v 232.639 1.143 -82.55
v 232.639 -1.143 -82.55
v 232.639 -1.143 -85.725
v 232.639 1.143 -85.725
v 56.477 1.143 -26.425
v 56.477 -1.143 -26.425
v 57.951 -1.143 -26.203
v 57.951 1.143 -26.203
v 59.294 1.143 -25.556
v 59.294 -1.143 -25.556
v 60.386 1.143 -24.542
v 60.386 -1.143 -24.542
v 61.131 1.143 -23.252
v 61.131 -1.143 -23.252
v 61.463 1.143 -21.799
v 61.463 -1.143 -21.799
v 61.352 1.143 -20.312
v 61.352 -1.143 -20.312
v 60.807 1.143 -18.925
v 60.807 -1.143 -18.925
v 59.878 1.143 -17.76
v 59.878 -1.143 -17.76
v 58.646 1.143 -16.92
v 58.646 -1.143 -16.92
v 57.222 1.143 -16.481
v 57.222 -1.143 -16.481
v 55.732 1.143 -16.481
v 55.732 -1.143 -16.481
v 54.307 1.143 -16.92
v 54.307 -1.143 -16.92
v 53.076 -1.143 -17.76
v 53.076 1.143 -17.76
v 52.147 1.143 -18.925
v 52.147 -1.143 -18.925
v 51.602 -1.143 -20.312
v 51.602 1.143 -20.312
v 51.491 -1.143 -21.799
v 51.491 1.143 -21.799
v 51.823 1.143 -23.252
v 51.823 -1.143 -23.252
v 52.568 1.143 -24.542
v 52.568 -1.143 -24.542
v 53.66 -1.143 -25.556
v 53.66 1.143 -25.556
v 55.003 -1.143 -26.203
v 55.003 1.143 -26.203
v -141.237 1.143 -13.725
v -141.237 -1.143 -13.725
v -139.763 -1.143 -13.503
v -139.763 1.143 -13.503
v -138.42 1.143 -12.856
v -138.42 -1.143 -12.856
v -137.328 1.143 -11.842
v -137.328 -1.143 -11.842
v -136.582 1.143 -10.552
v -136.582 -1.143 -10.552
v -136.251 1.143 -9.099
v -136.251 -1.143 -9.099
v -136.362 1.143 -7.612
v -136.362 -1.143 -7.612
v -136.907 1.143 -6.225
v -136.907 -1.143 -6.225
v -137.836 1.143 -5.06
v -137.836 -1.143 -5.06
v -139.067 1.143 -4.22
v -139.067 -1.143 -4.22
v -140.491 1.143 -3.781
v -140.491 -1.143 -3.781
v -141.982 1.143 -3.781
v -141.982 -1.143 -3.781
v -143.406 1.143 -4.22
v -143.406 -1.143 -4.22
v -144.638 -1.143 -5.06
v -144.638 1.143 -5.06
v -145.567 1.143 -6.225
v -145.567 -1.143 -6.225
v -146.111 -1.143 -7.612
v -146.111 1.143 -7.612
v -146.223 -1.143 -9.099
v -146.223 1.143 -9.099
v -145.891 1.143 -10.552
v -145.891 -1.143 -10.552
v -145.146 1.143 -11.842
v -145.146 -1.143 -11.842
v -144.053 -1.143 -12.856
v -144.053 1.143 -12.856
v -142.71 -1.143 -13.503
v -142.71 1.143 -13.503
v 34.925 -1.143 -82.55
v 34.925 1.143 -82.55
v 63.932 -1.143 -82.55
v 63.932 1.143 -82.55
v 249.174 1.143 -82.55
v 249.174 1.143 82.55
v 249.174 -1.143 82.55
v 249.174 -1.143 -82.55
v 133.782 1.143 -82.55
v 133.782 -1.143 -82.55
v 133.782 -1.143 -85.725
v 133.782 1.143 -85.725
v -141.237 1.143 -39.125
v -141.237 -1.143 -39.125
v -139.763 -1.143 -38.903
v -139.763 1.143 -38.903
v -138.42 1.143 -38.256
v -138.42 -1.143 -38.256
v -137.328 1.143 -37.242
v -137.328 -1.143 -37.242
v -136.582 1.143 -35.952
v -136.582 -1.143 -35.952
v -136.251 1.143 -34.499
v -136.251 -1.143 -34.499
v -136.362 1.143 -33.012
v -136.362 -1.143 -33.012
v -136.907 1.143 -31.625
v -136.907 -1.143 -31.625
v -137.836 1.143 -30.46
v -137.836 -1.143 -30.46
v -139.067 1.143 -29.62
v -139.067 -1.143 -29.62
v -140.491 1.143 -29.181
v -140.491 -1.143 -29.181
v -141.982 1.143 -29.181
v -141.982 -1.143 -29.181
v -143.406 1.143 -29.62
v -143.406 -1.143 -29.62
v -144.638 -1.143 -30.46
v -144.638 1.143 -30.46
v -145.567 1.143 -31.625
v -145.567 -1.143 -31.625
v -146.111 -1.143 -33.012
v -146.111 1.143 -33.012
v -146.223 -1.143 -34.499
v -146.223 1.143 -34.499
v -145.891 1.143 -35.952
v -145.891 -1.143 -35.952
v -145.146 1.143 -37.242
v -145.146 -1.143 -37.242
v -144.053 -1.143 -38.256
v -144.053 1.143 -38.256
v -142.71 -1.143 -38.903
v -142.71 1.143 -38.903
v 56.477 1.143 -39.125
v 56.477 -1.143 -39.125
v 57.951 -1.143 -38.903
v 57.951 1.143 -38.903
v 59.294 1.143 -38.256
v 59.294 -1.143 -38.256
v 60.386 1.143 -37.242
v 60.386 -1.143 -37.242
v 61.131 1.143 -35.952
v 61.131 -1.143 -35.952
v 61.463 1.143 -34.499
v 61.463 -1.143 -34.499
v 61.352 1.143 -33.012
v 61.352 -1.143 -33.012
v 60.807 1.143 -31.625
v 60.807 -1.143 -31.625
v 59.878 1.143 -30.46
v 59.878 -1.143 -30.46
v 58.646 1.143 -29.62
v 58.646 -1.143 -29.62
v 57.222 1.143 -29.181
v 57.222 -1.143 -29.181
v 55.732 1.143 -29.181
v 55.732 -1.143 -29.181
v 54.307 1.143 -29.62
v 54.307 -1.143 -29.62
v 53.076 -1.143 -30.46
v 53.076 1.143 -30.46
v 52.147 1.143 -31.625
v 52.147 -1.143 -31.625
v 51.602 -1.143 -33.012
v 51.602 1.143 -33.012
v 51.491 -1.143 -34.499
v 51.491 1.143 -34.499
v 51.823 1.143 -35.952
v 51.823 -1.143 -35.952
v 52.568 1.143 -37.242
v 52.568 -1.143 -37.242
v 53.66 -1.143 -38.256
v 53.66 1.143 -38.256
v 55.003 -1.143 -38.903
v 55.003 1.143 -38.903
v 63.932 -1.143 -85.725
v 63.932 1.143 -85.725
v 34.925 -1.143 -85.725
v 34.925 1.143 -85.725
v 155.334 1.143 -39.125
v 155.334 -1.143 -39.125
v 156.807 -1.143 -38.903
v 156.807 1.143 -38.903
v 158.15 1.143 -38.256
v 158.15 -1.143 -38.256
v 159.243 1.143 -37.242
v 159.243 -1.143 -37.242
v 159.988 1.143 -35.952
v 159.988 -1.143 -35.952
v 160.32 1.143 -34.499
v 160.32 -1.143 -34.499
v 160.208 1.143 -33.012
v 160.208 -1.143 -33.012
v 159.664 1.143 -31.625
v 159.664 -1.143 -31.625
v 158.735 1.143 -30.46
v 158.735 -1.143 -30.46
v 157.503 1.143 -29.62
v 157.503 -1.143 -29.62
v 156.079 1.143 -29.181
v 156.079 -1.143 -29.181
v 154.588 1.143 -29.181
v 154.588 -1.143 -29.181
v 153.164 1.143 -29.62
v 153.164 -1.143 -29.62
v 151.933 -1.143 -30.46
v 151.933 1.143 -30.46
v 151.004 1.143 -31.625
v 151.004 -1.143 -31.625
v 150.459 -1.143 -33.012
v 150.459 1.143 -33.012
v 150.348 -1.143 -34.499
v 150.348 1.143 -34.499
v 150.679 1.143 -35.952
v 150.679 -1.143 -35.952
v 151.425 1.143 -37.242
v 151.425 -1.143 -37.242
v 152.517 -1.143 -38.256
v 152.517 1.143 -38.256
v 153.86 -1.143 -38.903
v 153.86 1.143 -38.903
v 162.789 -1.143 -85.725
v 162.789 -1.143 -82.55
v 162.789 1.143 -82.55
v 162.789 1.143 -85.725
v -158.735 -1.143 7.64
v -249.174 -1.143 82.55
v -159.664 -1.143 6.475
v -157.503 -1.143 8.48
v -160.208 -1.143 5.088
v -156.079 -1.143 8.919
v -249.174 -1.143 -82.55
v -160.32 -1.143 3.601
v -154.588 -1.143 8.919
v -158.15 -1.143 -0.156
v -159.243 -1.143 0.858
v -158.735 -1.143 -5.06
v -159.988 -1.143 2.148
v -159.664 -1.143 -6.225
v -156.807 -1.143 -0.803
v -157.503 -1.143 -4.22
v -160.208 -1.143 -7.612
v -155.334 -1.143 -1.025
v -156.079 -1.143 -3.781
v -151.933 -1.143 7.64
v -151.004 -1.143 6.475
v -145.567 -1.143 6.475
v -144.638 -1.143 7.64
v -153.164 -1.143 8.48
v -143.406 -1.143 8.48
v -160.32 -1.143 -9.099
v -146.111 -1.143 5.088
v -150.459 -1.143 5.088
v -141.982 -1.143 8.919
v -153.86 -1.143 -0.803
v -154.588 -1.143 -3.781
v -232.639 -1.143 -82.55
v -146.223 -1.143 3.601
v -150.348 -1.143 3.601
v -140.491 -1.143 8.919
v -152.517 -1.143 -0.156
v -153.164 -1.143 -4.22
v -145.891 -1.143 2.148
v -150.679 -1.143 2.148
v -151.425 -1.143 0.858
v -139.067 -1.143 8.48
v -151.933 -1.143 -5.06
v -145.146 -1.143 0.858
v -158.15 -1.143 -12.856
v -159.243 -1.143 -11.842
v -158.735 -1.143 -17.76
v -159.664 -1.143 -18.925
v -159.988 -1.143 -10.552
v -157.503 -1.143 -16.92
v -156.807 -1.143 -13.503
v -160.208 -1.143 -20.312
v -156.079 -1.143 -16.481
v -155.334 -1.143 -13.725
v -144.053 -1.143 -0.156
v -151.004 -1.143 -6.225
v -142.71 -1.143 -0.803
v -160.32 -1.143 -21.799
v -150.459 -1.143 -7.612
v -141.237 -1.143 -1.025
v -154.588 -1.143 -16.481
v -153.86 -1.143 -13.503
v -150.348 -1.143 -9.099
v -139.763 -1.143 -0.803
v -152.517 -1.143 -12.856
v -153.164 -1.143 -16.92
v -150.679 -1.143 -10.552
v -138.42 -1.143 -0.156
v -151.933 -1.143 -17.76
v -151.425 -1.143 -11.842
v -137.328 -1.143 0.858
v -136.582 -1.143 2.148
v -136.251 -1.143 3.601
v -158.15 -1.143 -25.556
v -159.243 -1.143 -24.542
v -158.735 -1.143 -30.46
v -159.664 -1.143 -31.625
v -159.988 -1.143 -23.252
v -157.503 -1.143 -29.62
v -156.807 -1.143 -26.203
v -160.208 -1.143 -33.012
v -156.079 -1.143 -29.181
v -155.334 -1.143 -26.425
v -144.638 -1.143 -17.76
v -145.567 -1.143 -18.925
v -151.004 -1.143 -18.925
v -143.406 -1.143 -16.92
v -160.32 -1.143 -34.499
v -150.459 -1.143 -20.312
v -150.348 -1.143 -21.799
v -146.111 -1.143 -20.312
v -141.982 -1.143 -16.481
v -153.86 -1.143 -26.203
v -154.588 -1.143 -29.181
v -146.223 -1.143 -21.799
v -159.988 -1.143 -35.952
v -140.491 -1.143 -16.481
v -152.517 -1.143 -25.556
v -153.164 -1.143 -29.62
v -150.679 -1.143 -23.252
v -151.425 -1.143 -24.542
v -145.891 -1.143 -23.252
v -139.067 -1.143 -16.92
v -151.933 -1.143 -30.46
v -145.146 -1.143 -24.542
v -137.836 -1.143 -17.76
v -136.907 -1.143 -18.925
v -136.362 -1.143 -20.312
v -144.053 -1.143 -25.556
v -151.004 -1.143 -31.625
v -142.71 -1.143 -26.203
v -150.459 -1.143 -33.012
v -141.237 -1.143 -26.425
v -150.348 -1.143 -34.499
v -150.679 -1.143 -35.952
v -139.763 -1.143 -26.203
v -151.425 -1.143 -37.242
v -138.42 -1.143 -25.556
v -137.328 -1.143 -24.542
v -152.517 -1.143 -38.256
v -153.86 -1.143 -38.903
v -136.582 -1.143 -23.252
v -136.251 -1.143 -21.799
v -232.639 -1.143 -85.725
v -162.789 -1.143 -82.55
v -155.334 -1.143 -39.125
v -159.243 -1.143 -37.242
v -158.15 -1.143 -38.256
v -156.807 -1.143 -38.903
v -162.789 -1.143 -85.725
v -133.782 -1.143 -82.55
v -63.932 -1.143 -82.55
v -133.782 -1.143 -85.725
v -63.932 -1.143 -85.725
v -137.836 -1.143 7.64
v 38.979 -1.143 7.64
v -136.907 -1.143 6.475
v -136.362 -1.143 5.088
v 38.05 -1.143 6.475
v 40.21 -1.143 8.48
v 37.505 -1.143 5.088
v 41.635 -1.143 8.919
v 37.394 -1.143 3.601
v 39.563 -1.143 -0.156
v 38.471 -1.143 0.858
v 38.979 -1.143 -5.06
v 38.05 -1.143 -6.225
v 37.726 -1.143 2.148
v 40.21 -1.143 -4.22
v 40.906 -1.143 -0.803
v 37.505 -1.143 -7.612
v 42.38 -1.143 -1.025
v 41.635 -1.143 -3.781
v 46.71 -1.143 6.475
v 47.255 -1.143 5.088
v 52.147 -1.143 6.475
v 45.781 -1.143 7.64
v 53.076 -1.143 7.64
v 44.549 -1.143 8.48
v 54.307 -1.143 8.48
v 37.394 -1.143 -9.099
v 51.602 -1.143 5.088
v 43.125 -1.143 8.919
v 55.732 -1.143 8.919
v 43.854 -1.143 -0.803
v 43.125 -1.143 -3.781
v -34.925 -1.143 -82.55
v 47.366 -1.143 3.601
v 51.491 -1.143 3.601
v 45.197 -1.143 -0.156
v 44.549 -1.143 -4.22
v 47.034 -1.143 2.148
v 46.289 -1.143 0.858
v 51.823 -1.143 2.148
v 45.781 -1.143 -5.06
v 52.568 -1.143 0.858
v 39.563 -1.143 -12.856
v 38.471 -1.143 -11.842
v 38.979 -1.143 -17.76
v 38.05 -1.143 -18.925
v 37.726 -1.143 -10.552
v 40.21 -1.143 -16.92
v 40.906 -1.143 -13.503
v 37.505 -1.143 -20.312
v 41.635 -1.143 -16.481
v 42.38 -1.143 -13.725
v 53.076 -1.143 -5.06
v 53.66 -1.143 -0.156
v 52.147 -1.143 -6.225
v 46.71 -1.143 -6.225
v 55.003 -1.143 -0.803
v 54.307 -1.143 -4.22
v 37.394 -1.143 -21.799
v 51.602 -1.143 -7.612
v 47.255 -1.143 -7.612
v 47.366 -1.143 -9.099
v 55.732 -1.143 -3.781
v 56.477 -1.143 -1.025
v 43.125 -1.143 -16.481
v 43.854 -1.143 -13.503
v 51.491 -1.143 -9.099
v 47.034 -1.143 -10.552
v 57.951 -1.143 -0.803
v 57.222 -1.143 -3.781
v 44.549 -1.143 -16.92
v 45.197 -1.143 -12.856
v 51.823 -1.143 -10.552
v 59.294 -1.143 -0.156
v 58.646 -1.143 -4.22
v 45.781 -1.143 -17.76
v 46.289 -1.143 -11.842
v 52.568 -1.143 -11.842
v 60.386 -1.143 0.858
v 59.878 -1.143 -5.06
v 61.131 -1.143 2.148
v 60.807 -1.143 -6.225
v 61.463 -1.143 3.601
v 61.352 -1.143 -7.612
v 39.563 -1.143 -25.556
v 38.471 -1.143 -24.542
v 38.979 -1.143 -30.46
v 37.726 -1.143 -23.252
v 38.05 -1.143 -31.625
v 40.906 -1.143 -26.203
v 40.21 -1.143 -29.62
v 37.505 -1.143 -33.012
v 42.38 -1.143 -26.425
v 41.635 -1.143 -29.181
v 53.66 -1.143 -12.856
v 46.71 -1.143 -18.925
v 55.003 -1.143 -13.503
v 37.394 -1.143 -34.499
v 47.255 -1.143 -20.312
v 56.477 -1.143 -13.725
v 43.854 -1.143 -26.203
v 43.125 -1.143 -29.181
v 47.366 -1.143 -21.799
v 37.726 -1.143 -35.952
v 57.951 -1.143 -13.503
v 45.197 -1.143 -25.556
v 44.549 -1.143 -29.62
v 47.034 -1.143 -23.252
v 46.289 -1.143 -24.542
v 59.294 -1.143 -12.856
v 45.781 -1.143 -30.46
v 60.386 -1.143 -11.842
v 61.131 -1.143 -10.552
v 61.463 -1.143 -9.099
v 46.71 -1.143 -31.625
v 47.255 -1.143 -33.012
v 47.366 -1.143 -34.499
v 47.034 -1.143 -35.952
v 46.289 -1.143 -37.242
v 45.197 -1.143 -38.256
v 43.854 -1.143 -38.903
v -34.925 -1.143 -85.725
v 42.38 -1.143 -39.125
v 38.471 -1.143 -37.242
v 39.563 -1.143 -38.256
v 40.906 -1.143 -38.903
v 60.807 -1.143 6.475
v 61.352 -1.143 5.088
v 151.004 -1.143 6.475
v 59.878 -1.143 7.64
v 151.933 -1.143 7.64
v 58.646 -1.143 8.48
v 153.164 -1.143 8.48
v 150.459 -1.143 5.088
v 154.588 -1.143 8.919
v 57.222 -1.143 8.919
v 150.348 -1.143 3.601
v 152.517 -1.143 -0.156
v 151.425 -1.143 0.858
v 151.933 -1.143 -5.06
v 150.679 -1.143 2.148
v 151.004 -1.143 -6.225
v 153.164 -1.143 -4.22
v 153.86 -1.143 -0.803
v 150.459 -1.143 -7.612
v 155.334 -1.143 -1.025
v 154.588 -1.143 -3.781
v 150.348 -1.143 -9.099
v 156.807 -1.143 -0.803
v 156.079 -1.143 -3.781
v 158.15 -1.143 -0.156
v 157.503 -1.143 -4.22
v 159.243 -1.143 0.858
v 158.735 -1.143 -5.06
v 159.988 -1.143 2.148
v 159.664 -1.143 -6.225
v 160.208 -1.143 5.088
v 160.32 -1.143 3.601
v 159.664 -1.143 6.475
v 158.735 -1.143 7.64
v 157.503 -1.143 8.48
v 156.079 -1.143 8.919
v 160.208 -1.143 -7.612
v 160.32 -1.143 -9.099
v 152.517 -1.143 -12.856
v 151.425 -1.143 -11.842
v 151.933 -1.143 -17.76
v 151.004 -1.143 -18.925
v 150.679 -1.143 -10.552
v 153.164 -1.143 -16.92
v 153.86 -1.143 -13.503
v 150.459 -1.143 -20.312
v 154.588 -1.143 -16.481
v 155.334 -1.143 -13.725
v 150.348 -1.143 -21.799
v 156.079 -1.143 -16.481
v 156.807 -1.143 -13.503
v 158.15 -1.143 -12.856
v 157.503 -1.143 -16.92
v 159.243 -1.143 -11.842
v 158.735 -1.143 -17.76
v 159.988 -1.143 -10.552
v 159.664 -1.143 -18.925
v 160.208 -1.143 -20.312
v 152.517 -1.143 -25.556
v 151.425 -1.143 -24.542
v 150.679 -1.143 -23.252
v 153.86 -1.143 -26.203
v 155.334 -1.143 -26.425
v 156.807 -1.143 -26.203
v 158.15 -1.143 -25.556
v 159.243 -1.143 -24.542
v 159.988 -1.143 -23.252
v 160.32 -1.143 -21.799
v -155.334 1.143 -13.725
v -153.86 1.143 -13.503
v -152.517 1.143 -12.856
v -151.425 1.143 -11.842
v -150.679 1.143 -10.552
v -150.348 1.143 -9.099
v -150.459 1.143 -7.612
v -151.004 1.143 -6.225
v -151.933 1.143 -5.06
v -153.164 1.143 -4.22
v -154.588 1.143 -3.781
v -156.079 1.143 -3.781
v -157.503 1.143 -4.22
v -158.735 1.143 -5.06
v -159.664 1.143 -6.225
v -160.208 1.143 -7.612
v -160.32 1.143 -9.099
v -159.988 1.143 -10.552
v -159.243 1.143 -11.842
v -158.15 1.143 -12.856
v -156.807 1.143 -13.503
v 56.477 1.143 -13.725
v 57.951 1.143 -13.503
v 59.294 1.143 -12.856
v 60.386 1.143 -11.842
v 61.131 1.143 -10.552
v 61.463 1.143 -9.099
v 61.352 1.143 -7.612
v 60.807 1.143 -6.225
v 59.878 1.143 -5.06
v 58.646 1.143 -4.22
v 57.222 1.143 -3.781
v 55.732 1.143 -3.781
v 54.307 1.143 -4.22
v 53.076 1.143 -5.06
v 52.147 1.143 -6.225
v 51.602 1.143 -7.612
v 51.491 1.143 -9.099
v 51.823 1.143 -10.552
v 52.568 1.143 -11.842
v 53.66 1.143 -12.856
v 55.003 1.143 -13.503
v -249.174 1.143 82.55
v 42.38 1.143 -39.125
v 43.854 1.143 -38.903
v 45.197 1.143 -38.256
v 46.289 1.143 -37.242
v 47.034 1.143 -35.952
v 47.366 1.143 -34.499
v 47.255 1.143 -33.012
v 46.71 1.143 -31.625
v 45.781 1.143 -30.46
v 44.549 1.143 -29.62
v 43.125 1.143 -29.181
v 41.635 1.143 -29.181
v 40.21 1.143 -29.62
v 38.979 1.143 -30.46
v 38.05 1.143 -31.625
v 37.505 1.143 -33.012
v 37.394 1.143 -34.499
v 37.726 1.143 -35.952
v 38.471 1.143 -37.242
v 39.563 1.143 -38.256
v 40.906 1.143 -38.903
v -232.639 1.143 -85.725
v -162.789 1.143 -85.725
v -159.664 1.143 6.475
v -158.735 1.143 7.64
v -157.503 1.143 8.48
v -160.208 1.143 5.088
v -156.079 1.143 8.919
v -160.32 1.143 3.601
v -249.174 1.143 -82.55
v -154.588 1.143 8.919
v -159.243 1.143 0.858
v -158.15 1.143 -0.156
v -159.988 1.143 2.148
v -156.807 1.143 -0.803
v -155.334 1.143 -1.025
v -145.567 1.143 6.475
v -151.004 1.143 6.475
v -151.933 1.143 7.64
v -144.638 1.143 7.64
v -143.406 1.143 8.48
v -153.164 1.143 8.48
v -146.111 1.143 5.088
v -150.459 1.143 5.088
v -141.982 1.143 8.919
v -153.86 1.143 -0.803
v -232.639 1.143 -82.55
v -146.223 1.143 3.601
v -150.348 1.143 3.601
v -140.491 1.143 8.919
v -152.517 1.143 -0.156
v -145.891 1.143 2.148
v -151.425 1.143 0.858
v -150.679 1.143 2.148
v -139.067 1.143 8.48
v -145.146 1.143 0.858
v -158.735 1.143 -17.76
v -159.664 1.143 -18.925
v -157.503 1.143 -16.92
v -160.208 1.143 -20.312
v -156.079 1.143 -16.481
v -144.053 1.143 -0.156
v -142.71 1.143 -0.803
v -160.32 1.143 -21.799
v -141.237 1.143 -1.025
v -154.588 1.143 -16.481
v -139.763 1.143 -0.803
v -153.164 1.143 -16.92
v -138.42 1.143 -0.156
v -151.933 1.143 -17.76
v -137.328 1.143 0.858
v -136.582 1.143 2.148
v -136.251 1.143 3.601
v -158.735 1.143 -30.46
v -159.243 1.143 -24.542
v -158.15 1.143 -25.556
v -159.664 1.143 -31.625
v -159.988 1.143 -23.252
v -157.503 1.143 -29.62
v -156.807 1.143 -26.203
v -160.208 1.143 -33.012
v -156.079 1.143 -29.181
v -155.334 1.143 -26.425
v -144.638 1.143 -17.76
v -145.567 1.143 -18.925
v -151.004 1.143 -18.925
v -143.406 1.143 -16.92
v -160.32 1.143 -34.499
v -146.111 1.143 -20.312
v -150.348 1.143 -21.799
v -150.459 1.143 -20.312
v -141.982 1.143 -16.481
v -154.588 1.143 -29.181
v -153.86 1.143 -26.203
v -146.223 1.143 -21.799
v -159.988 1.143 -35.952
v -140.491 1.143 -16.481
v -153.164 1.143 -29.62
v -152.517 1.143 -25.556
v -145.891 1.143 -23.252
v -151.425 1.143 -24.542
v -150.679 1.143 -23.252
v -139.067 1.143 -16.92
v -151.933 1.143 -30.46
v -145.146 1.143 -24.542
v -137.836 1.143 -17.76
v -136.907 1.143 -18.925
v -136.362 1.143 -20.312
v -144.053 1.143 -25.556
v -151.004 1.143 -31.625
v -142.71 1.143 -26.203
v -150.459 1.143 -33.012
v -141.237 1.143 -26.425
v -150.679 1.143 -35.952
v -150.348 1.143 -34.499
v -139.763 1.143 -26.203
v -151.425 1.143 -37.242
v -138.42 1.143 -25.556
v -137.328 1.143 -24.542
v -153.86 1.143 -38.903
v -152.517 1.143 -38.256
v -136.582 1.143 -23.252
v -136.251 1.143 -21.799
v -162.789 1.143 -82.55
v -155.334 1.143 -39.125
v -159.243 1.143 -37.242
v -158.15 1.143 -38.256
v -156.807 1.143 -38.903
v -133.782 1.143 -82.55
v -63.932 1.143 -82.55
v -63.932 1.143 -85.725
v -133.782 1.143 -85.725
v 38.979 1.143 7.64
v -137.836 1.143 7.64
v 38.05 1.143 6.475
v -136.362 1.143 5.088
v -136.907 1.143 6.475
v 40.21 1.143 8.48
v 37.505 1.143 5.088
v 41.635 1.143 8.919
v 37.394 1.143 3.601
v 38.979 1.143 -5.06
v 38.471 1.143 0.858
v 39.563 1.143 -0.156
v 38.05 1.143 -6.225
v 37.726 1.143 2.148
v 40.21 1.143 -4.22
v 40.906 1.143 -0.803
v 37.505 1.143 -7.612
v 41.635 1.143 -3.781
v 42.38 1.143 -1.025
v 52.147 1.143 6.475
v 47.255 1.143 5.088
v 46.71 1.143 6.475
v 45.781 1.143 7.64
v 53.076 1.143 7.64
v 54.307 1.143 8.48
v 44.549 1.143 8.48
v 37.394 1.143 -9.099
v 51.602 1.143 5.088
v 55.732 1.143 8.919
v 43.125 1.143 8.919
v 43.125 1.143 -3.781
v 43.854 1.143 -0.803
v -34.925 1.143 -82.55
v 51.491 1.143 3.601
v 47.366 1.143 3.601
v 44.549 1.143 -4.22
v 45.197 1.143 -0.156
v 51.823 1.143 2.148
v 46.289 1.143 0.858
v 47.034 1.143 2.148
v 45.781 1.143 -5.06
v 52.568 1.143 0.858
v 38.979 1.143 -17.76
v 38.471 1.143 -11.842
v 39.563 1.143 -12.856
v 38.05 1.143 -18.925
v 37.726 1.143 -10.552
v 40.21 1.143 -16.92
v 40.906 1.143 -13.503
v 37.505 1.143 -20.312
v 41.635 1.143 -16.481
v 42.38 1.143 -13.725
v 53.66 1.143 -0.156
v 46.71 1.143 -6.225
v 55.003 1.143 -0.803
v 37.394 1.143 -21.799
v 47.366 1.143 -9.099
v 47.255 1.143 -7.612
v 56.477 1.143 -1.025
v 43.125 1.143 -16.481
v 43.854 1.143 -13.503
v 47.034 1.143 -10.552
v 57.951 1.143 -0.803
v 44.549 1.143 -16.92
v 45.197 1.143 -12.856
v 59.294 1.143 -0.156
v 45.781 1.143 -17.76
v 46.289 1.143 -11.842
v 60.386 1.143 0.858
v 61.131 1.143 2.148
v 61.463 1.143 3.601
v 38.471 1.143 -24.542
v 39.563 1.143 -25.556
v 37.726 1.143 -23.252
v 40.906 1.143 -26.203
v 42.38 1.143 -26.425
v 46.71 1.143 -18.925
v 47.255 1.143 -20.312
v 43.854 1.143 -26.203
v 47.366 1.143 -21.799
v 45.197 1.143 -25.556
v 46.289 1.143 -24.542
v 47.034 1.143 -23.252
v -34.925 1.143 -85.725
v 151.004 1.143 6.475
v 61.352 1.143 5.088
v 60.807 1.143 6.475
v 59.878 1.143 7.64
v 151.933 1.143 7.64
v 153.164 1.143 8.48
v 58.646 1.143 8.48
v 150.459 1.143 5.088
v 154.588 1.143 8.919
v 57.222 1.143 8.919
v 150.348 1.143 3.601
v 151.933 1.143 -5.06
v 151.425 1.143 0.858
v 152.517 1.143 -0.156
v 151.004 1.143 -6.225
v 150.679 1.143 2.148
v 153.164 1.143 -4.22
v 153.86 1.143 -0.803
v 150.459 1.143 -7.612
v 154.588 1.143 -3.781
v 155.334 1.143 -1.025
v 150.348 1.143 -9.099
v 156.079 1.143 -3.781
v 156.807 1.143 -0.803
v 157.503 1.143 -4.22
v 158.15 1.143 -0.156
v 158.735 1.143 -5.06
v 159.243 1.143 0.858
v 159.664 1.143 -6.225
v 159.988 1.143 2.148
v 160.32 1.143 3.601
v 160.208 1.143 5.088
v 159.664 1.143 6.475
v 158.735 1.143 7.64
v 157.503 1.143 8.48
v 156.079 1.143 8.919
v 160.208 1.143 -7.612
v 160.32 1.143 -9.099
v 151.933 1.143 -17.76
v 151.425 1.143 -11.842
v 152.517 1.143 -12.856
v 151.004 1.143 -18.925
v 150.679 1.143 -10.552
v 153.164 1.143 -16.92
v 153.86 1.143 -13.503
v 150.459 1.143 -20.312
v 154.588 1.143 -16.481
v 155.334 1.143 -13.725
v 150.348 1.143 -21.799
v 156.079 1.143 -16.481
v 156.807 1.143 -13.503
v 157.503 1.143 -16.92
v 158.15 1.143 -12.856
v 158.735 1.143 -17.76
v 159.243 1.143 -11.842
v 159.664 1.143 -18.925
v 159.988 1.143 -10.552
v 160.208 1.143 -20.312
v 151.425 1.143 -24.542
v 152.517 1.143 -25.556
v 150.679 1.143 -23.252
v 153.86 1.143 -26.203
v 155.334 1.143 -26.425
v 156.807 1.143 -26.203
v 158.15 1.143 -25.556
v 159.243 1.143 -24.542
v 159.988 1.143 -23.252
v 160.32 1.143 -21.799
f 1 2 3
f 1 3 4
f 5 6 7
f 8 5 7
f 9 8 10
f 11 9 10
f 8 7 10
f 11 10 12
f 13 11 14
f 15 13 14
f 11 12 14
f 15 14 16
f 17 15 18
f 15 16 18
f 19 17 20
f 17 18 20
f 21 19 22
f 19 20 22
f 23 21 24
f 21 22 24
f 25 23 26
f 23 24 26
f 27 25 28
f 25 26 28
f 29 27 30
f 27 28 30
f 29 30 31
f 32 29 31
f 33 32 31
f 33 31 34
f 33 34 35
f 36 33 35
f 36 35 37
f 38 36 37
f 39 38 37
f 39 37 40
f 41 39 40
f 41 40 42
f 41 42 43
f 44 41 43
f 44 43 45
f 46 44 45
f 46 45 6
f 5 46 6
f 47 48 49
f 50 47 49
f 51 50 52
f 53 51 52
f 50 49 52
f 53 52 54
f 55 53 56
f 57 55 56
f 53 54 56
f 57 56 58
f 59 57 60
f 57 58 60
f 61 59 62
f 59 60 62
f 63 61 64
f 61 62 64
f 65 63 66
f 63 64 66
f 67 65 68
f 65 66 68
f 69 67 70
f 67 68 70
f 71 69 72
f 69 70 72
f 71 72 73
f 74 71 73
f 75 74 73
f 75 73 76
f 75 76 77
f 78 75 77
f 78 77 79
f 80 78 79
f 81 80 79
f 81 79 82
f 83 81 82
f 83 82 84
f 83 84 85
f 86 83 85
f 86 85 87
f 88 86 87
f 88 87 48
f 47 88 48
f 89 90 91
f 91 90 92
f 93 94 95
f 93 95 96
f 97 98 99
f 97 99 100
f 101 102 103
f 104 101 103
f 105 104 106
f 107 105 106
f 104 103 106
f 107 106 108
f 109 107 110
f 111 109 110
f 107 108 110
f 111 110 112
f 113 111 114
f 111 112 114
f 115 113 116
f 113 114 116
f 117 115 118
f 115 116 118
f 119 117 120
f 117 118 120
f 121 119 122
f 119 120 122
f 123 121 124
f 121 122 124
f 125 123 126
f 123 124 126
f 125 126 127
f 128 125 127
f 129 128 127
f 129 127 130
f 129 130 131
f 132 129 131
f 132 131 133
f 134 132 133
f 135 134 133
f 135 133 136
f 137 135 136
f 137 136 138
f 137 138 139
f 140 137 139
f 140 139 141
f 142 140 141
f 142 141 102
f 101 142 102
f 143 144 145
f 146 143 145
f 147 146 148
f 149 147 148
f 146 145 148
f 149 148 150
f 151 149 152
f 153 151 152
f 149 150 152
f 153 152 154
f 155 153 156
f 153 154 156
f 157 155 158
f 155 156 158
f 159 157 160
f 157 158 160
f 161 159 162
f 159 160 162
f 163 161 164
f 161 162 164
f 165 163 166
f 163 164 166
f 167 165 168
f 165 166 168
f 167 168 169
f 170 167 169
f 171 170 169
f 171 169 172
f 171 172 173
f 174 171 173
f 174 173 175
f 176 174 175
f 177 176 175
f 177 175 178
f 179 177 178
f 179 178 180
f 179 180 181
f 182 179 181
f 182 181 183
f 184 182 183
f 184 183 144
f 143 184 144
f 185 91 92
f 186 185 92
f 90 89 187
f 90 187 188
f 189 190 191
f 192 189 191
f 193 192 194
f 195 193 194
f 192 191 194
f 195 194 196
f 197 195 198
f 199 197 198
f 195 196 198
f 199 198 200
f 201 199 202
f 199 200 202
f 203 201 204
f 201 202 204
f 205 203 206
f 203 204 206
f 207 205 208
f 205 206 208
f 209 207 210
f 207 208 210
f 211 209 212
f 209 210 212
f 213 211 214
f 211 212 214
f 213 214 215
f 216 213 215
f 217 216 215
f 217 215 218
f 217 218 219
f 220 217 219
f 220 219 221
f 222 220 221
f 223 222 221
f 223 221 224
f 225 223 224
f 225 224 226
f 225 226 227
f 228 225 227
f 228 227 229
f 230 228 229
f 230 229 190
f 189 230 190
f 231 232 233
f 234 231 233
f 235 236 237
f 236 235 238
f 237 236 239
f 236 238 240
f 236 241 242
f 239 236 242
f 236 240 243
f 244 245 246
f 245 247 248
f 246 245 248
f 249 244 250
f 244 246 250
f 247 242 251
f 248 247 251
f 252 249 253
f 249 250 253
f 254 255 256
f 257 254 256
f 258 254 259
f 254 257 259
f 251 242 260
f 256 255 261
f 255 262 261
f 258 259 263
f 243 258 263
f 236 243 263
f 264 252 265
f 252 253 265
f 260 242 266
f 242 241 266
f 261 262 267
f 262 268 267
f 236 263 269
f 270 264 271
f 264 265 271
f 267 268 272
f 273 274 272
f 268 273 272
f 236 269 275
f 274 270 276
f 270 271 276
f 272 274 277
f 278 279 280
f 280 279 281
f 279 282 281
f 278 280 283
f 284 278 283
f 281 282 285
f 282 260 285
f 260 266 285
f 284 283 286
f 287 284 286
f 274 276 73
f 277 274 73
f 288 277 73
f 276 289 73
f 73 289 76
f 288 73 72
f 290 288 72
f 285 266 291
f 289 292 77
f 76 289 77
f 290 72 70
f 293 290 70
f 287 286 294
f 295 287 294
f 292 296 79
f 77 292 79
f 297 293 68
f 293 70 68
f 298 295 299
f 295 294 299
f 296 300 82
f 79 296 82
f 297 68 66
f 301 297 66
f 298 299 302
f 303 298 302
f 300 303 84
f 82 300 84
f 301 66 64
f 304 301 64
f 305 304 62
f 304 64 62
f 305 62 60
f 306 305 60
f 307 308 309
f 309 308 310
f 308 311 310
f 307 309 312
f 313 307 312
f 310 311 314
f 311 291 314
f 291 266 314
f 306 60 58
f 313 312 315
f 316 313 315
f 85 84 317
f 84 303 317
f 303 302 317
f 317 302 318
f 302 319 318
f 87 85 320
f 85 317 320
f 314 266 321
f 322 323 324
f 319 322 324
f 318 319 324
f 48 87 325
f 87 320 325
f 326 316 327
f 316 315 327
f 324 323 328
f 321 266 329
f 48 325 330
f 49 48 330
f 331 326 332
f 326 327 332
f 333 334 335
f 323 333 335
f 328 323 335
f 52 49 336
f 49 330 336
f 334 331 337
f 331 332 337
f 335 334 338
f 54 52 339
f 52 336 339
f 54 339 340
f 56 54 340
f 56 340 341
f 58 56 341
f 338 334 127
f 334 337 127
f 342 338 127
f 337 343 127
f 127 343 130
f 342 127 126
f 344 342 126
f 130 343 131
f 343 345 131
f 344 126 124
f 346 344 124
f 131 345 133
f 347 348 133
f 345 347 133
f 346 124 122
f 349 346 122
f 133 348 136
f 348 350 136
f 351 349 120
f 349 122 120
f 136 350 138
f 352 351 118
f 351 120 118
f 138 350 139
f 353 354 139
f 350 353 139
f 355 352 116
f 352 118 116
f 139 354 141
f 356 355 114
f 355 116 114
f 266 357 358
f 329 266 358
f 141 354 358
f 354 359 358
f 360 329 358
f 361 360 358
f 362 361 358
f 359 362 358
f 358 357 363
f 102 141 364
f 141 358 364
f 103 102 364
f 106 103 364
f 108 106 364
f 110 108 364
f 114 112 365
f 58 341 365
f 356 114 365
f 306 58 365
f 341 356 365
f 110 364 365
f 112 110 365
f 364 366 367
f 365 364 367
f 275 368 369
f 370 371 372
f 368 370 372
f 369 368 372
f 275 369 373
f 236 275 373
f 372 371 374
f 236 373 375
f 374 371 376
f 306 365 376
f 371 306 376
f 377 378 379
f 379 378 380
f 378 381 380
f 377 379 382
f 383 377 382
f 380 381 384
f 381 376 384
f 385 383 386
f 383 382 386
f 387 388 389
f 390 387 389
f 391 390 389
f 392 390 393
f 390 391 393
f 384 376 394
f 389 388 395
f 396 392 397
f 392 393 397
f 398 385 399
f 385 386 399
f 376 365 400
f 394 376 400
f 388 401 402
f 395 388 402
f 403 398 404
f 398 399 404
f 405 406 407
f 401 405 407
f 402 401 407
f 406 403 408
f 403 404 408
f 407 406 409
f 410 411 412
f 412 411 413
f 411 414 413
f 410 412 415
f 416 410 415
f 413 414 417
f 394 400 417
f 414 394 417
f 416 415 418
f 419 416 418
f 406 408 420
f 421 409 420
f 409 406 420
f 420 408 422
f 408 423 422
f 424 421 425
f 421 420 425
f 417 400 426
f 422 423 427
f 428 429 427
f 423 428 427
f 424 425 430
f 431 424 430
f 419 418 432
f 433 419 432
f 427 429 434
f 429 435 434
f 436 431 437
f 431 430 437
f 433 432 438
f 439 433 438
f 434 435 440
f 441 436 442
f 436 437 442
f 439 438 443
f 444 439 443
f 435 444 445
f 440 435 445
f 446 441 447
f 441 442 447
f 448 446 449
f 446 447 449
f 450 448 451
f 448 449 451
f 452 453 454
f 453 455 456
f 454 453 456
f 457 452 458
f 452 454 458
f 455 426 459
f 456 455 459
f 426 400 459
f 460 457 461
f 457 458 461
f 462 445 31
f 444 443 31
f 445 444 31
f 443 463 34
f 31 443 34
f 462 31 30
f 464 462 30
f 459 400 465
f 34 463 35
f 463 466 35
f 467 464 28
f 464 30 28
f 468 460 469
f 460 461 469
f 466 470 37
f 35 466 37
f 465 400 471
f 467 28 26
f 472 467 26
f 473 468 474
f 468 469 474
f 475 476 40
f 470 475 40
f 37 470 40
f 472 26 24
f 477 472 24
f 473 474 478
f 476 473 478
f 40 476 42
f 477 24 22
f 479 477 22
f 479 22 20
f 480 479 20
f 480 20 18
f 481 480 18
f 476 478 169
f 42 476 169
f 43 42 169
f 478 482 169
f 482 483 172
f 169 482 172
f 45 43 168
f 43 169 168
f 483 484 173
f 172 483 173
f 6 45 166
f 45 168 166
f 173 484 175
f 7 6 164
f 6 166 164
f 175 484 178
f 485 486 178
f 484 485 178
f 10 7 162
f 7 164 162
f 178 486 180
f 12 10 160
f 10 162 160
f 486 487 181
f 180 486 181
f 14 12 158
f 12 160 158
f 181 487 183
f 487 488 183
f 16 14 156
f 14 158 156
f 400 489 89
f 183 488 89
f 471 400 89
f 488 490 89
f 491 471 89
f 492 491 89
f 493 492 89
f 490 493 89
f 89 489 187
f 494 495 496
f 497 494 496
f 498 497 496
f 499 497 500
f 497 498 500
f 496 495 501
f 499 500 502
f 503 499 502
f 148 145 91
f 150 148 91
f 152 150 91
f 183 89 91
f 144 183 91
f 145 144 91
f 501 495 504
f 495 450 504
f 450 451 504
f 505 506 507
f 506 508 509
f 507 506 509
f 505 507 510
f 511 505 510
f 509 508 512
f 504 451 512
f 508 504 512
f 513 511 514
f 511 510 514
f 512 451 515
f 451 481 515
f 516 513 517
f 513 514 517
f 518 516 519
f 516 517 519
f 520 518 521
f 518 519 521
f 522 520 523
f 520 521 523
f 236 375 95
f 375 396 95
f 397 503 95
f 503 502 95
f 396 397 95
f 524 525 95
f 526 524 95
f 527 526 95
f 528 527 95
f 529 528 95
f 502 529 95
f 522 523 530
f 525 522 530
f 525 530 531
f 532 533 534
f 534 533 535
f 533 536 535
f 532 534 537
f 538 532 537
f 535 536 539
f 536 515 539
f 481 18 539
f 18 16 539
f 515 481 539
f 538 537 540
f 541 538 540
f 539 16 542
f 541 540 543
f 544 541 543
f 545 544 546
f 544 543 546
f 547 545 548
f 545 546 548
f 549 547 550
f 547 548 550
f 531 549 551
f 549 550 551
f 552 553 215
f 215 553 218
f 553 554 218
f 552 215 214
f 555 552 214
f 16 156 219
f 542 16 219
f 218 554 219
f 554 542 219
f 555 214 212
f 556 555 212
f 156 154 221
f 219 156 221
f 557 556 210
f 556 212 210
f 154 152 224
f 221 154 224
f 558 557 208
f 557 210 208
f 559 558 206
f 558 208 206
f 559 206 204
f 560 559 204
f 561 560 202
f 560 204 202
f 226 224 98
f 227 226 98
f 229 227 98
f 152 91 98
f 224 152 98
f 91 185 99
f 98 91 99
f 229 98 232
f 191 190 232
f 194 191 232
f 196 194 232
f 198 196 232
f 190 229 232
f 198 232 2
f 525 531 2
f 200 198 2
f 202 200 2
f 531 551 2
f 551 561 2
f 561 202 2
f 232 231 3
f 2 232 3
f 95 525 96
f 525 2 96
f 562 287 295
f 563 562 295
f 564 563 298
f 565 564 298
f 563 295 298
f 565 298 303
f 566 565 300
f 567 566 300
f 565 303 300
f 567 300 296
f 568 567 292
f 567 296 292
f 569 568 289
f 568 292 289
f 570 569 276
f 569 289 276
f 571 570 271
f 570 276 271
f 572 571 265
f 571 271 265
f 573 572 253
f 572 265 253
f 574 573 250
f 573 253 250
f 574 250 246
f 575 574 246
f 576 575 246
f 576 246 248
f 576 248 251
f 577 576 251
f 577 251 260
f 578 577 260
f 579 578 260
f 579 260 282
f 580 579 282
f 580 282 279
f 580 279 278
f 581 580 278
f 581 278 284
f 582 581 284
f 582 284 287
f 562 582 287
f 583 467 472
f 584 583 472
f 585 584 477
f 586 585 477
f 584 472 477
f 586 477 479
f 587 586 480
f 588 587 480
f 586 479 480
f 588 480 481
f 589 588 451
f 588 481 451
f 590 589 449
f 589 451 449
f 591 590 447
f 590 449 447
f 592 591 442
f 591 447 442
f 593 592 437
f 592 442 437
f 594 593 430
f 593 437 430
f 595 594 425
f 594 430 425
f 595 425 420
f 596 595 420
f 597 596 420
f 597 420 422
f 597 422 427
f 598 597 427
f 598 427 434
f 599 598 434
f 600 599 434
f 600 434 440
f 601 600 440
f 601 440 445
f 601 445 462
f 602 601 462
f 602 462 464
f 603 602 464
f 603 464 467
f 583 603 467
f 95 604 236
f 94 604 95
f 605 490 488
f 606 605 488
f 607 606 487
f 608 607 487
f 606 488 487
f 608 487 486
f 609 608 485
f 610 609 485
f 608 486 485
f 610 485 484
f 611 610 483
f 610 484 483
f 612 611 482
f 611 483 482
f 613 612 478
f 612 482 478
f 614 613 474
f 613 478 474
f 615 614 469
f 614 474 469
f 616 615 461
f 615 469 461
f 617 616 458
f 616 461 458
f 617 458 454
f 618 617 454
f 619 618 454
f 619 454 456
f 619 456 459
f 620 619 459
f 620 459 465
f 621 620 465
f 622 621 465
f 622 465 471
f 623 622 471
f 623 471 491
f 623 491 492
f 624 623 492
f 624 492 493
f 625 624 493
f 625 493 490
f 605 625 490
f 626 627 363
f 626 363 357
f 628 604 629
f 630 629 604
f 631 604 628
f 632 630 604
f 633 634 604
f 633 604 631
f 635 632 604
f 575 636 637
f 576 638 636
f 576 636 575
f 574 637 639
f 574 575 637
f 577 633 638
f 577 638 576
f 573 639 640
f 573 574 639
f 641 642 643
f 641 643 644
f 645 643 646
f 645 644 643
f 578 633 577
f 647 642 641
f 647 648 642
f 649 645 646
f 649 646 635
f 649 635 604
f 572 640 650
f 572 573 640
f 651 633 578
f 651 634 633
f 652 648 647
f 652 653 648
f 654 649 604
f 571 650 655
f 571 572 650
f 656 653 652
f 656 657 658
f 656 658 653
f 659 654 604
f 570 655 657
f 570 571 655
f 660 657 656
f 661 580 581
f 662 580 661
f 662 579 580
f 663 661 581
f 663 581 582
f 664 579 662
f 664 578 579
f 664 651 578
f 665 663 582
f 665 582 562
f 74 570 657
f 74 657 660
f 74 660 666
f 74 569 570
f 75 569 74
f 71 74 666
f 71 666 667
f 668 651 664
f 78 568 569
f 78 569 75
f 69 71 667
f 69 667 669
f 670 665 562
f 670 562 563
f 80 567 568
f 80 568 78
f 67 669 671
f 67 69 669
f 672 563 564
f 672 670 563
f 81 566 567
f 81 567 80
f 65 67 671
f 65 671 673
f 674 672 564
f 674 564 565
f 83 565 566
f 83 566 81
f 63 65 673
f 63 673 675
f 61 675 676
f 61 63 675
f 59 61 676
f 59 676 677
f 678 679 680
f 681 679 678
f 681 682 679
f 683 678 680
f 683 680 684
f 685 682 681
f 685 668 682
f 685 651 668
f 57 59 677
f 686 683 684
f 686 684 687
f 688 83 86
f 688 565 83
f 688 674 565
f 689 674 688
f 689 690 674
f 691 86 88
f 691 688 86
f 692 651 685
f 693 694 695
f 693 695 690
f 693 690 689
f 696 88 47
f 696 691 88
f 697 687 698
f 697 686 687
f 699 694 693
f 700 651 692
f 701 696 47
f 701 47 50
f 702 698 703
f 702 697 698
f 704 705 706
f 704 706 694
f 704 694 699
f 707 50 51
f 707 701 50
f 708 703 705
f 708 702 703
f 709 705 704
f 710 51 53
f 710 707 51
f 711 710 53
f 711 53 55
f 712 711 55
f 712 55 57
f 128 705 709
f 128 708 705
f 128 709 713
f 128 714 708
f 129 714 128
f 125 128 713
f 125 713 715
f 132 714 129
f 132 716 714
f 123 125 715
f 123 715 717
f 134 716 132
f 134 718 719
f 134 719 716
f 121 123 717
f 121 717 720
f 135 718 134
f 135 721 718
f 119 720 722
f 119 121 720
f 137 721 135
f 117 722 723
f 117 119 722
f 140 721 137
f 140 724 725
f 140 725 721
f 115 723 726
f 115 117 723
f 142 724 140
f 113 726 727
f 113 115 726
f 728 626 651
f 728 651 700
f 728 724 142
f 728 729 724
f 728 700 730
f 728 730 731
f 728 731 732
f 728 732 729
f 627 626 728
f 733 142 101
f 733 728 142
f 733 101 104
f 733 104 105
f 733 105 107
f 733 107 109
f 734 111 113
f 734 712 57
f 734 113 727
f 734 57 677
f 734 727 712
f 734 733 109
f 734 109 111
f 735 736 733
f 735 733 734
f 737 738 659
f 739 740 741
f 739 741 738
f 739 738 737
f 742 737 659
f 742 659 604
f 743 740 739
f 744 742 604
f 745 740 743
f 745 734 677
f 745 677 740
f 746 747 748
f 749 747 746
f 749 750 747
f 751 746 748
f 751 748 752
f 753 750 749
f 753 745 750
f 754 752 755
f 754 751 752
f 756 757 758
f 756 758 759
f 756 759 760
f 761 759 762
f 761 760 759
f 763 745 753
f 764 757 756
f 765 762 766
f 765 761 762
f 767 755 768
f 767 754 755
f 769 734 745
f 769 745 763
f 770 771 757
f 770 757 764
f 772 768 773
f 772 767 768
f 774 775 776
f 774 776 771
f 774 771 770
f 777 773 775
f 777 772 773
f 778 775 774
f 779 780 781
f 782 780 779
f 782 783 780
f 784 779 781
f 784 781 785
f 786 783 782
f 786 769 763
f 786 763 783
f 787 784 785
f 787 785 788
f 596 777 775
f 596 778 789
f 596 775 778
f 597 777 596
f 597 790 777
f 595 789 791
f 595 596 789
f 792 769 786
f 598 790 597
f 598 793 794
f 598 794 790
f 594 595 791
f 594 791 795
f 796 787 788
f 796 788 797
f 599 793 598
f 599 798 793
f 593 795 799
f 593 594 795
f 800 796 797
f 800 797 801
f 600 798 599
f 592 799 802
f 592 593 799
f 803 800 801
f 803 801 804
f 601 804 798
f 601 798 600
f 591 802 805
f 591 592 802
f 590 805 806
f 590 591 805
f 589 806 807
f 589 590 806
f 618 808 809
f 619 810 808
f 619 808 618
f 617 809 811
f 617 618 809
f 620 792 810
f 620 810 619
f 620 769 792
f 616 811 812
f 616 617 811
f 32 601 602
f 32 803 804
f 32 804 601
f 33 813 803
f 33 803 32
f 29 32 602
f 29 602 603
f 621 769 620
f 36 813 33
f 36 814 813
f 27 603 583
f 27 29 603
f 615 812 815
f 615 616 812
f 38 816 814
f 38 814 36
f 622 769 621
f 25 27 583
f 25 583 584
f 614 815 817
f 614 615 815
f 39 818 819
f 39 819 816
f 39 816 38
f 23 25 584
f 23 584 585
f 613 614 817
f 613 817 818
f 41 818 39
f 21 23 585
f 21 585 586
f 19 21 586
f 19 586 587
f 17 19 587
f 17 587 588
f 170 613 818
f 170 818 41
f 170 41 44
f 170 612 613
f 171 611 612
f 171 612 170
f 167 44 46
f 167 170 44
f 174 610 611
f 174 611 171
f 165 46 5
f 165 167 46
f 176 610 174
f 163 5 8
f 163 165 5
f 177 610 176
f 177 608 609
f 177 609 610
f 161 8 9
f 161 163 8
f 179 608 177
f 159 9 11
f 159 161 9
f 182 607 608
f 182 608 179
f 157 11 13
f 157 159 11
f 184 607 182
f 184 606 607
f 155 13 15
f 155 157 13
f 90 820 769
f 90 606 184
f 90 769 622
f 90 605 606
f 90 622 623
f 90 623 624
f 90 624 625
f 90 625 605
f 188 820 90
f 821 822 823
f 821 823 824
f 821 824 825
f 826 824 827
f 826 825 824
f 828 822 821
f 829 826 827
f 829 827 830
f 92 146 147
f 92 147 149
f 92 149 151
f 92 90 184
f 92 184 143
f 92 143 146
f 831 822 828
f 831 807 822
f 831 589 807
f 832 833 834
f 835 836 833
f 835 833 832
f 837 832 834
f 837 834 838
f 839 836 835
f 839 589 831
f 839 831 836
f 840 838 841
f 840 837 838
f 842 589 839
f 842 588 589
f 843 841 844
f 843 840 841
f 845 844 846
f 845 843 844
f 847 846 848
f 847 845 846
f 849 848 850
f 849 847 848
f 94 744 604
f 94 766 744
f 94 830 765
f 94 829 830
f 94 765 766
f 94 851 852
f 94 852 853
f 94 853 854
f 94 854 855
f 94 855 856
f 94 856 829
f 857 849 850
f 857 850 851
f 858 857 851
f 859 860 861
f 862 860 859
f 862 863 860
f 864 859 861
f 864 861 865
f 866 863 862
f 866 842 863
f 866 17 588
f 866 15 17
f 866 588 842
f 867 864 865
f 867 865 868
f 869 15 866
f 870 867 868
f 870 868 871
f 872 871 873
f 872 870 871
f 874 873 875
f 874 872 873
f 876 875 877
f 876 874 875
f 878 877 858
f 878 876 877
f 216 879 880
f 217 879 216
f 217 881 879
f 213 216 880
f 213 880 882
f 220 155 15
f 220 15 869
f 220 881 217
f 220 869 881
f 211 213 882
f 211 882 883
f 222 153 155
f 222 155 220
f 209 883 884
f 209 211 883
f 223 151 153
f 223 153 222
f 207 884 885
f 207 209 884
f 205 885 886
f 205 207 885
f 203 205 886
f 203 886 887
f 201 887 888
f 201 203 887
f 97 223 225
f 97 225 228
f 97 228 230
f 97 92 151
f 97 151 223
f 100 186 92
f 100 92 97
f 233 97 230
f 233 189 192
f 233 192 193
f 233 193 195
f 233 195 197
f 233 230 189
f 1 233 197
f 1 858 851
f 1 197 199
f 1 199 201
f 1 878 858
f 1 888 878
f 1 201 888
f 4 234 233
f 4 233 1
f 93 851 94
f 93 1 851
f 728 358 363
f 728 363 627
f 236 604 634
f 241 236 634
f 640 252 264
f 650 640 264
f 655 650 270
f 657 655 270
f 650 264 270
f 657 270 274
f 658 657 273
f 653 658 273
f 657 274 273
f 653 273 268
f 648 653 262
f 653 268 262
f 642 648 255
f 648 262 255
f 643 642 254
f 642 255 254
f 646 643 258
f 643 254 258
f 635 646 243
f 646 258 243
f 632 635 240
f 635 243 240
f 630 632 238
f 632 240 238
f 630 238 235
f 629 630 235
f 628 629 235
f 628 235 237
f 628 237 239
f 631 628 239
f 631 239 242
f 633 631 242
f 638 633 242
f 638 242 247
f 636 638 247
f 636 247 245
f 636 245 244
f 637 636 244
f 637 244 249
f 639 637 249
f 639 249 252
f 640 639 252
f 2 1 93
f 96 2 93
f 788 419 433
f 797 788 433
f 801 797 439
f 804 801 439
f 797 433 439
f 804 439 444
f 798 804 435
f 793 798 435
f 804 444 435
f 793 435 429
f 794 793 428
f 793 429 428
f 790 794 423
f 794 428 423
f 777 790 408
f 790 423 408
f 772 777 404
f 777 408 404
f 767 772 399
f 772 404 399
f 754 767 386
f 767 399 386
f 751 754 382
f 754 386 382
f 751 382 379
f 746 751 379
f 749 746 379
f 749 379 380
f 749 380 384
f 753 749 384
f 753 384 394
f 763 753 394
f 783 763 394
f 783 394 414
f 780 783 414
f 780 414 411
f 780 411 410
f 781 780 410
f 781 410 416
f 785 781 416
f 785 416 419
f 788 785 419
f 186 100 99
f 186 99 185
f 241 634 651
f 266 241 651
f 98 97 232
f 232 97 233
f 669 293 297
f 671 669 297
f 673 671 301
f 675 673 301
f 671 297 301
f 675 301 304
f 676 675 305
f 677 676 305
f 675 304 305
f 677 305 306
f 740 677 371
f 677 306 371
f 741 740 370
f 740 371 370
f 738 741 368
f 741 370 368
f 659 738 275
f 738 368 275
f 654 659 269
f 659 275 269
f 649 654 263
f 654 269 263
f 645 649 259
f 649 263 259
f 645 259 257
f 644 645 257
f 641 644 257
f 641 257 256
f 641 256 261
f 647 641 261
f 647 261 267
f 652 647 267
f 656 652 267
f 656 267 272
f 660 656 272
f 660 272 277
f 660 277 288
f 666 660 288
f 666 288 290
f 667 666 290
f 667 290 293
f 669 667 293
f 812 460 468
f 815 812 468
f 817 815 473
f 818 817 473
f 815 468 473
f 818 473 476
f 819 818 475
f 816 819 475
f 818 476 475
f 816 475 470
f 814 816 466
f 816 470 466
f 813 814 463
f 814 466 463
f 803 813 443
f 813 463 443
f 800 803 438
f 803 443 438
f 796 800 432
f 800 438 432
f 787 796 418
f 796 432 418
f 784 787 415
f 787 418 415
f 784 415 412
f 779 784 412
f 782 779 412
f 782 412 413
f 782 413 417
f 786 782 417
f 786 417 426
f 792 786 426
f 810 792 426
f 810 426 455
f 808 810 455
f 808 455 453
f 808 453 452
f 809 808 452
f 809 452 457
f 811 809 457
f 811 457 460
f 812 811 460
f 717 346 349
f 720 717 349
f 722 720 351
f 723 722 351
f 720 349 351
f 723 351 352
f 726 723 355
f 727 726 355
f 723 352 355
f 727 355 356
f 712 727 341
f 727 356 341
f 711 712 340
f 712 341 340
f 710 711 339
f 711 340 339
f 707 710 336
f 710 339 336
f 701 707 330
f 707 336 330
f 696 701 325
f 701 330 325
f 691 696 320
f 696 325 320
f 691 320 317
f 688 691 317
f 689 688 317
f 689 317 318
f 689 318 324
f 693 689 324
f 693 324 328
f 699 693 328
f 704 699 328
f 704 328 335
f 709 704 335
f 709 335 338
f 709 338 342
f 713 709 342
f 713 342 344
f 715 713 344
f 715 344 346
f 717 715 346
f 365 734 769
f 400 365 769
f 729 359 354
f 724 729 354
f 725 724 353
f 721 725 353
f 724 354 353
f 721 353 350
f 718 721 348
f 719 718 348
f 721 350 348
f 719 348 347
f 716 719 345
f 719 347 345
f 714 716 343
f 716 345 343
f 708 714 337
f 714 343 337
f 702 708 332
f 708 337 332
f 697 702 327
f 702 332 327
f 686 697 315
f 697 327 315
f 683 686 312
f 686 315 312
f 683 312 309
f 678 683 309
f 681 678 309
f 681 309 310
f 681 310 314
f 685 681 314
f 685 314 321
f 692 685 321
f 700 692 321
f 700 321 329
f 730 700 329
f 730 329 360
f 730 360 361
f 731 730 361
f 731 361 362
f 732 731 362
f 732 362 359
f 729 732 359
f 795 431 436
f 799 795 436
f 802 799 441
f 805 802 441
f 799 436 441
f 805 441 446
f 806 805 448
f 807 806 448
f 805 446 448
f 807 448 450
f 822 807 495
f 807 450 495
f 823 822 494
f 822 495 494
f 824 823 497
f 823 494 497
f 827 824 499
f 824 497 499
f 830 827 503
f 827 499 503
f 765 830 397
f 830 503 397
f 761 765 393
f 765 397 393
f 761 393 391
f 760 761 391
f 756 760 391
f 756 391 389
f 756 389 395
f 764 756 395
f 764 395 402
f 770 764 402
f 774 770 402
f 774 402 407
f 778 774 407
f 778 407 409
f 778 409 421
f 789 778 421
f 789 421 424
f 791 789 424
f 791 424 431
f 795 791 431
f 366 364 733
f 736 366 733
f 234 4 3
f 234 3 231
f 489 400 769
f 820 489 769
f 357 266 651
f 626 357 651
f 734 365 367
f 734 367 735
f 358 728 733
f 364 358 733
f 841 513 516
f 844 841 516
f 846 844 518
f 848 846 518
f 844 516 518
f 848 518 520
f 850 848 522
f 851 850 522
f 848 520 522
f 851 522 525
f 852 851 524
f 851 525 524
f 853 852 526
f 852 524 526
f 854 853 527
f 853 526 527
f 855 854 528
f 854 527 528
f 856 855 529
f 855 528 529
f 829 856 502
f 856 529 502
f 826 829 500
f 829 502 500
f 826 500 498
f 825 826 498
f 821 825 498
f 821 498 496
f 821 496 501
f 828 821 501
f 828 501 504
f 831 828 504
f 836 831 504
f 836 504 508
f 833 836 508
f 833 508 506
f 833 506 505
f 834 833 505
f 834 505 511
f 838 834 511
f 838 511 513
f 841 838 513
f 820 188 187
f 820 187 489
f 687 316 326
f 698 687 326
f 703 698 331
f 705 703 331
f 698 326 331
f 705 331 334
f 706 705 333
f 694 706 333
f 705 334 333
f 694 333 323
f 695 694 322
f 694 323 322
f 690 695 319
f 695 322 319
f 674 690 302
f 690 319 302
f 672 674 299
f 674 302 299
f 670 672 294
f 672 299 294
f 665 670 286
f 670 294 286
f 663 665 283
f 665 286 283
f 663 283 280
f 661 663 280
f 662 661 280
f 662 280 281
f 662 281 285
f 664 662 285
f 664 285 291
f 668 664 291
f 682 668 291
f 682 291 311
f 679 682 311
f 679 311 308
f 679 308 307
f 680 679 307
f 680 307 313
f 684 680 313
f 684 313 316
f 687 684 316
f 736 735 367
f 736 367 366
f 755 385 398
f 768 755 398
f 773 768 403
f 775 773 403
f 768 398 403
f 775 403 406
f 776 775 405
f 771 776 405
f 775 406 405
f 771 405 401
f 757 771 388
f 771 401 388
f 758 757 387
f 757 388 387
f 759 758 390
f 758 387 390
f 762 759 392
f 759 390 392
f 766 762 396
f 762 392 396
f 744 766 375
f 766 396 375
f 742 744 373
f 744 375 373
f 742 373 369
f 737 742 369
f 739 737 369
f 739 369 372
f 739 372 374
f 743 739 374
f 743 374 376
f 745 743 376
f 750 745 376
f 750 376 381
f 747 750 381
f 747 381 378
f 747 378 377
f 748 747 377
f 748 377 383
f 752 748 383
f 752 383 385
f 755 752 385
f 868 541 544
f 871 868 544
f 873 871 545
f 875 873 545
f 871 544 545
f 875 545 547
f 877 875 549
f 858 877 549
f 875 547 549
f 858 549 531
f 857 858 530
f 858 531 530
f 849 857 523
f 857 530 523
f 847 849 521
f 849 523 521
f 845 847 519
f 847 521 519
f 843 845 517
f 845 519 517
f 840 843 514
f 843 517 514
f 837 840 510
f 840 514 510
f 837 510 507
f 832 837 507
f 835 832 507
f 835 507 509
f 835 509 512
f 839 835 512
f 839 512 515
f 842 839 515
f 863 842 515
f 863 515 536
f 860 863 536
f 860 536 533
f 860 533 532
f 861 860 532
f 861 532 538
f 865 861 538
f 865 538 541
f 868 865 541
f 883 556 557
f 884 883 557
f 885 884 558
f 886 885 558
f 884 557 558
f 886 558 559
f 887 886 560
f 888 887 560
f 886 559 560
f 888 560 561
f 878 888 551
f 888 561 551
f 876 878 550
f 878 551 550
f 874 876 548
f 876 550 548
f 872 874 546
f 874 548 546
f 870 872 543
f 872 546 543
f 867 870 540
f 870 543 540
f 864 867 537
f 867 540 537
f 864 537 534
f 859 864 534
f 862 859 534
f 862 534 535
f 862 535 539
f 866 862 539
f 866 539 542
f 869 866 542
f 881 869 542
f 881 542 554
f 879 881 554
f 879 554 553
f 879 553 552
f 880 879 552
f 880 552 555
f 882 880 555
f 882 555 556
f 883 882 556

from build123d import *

# Parameters (mm, degrees)
SKETCH1_W           = 498.348
SKETCH1_H           = 165.1
BOSS_EXTRUDE1_DEPTH = 1.143
SKETCH2_W           = 69.85
SKETCH2_H           = 2.286
BOSS_EXTRUDE2_DEPTH = 3.175
LPATTERN1_COUNT     = 5
LPATTERN1_PITCH     = 98.8568
SKETCH3_R           = 5
CUT_EXTRUDE1_DEPTH  = 264.517900145


with BuildPart() as part:
    # Sketch1 → Boss-Extrude1 (new, symmetric)
    with BuildSketch(Plane(origin=(0, 0, 0), x_dir=(1, 0, 0), z_dir=(0, 1, 0))):
        Rectangle(SKETCH1_W, SKETCH1_H)
    extrude(amount=BOSS_EXTRUDE1_DEPTH, both=True)

    # Sketch2 → Boss-Extrude2 (add)
    with BuildSketch(Plane(origin=(0, 0, -82.55), x_dir=(-1, 0, 0), z_dir=(0, 0, -1))):
        with Locations((-197.7136, 0)):
            Rectangle(SKETCH2_W, SKETCH2_H)
    boss_extrude2 = extrude(amount=BOSS_EXTRUDE2_DEPTH)

    # LPattern1: Boss-Extrude2 ×5
    with Locations(*[(-i * LPATTERN1_PITCH, 0, 0) for i in range(1, LPATTERN1_COUNT)]):
        add(boss_extrude2)

    # Sketch3 → Cut-Extrude1 (cut, through all)
    with BuildSketch(Plane.XZ.offset(1.143)):
        with Locations(Location((-155.3337, 3.9751, 0), (0, 0, 270))):
            Circle(SKETCH3_R)
        with Locations(Location((-141.2367, 3.9751, 0), (0, 0, 270))):
            Circle(SKETCH3_R)
        with Locations(Location((-141.2367, -8.7249, 0), (0, 0, 270))):
            Circle(SKETCH3_R)
        with Locations(Location((-155.3337, -8.7249, 0), (0, 0, 270))):
            Circle(SKETCH3_R)
        with Locations(Location((-141.2367, -21.4249, 0), (0, 0, 270))):
            Circle(SKETCH3_R)
        with Locations(Location((-155.3337, -21.4249, 0), (0, 0, 270))):
            Circle(SKETCH3_R)
        with Locations(Location((-141.2367, -34.1249, 0), (0, 0, 270))):
            Circle(SKETCH3_R)
        with Locations(Location((-155.3337, -34.1249, 0), (0, 0, 270))):
            Circle(SKETCH3_R)
        with Locations(Location((56.4769, 3.9751, 0), (0, 0, 270))):
            Circle(SKETCH3_R)
        with Locations(Location((56.4769, -8.7249, 0), (0, 0, 270))):
            Circle(SKETCH3_R)
        with Locations(Location((42.3799, 3.9751, 0), (0, 0, 270))):
            Circle(SKETCH3_R)
        with Locations(Location((42.3799, -8.7249, 0), (0, 0, 270))):
            Circle(SKETCH3_R)
        with Locations(Location((56.4769, -21.4249, 0), (0, 0, 270))):
            Circle(SKETCH3_R)
        with Locations(Location((42.3799, -21.4249, 0), (0, 0, 270))):
            Circle(SKETCH3_R)
        with Locations(Location((56.4769, -34.1249, 0), (0, 0, 270))):
            Circle(SKETCH3_R)
        with Locations(Location((42.3799, -34.1249, 0), (0, 0, 270))):
            Circle(SKETCH3_R)
        with Locations(Location((155.3337, 3.9751, 0), (0, 0, 270))):
            Circle(SKETCH3_R)
        with Locations(Location((155.3337, -8.7249, 0), (0, 0, 270))):
            Circle(SKETCH3_R)
        with Locations(Location((155.3337, -21.4249, 0), (0, 0, 270))):
            Circle(SKETCH3_R)
        with Locations(Location((155.3337, -34.1249, 0), (0, 0, 270))):
            Circle(SKETCH3_R)
    extrude(amount=-CUT_EXTRUDE1_DEPTH, mode=Mode.SUBTRACT)


solid = part.part
